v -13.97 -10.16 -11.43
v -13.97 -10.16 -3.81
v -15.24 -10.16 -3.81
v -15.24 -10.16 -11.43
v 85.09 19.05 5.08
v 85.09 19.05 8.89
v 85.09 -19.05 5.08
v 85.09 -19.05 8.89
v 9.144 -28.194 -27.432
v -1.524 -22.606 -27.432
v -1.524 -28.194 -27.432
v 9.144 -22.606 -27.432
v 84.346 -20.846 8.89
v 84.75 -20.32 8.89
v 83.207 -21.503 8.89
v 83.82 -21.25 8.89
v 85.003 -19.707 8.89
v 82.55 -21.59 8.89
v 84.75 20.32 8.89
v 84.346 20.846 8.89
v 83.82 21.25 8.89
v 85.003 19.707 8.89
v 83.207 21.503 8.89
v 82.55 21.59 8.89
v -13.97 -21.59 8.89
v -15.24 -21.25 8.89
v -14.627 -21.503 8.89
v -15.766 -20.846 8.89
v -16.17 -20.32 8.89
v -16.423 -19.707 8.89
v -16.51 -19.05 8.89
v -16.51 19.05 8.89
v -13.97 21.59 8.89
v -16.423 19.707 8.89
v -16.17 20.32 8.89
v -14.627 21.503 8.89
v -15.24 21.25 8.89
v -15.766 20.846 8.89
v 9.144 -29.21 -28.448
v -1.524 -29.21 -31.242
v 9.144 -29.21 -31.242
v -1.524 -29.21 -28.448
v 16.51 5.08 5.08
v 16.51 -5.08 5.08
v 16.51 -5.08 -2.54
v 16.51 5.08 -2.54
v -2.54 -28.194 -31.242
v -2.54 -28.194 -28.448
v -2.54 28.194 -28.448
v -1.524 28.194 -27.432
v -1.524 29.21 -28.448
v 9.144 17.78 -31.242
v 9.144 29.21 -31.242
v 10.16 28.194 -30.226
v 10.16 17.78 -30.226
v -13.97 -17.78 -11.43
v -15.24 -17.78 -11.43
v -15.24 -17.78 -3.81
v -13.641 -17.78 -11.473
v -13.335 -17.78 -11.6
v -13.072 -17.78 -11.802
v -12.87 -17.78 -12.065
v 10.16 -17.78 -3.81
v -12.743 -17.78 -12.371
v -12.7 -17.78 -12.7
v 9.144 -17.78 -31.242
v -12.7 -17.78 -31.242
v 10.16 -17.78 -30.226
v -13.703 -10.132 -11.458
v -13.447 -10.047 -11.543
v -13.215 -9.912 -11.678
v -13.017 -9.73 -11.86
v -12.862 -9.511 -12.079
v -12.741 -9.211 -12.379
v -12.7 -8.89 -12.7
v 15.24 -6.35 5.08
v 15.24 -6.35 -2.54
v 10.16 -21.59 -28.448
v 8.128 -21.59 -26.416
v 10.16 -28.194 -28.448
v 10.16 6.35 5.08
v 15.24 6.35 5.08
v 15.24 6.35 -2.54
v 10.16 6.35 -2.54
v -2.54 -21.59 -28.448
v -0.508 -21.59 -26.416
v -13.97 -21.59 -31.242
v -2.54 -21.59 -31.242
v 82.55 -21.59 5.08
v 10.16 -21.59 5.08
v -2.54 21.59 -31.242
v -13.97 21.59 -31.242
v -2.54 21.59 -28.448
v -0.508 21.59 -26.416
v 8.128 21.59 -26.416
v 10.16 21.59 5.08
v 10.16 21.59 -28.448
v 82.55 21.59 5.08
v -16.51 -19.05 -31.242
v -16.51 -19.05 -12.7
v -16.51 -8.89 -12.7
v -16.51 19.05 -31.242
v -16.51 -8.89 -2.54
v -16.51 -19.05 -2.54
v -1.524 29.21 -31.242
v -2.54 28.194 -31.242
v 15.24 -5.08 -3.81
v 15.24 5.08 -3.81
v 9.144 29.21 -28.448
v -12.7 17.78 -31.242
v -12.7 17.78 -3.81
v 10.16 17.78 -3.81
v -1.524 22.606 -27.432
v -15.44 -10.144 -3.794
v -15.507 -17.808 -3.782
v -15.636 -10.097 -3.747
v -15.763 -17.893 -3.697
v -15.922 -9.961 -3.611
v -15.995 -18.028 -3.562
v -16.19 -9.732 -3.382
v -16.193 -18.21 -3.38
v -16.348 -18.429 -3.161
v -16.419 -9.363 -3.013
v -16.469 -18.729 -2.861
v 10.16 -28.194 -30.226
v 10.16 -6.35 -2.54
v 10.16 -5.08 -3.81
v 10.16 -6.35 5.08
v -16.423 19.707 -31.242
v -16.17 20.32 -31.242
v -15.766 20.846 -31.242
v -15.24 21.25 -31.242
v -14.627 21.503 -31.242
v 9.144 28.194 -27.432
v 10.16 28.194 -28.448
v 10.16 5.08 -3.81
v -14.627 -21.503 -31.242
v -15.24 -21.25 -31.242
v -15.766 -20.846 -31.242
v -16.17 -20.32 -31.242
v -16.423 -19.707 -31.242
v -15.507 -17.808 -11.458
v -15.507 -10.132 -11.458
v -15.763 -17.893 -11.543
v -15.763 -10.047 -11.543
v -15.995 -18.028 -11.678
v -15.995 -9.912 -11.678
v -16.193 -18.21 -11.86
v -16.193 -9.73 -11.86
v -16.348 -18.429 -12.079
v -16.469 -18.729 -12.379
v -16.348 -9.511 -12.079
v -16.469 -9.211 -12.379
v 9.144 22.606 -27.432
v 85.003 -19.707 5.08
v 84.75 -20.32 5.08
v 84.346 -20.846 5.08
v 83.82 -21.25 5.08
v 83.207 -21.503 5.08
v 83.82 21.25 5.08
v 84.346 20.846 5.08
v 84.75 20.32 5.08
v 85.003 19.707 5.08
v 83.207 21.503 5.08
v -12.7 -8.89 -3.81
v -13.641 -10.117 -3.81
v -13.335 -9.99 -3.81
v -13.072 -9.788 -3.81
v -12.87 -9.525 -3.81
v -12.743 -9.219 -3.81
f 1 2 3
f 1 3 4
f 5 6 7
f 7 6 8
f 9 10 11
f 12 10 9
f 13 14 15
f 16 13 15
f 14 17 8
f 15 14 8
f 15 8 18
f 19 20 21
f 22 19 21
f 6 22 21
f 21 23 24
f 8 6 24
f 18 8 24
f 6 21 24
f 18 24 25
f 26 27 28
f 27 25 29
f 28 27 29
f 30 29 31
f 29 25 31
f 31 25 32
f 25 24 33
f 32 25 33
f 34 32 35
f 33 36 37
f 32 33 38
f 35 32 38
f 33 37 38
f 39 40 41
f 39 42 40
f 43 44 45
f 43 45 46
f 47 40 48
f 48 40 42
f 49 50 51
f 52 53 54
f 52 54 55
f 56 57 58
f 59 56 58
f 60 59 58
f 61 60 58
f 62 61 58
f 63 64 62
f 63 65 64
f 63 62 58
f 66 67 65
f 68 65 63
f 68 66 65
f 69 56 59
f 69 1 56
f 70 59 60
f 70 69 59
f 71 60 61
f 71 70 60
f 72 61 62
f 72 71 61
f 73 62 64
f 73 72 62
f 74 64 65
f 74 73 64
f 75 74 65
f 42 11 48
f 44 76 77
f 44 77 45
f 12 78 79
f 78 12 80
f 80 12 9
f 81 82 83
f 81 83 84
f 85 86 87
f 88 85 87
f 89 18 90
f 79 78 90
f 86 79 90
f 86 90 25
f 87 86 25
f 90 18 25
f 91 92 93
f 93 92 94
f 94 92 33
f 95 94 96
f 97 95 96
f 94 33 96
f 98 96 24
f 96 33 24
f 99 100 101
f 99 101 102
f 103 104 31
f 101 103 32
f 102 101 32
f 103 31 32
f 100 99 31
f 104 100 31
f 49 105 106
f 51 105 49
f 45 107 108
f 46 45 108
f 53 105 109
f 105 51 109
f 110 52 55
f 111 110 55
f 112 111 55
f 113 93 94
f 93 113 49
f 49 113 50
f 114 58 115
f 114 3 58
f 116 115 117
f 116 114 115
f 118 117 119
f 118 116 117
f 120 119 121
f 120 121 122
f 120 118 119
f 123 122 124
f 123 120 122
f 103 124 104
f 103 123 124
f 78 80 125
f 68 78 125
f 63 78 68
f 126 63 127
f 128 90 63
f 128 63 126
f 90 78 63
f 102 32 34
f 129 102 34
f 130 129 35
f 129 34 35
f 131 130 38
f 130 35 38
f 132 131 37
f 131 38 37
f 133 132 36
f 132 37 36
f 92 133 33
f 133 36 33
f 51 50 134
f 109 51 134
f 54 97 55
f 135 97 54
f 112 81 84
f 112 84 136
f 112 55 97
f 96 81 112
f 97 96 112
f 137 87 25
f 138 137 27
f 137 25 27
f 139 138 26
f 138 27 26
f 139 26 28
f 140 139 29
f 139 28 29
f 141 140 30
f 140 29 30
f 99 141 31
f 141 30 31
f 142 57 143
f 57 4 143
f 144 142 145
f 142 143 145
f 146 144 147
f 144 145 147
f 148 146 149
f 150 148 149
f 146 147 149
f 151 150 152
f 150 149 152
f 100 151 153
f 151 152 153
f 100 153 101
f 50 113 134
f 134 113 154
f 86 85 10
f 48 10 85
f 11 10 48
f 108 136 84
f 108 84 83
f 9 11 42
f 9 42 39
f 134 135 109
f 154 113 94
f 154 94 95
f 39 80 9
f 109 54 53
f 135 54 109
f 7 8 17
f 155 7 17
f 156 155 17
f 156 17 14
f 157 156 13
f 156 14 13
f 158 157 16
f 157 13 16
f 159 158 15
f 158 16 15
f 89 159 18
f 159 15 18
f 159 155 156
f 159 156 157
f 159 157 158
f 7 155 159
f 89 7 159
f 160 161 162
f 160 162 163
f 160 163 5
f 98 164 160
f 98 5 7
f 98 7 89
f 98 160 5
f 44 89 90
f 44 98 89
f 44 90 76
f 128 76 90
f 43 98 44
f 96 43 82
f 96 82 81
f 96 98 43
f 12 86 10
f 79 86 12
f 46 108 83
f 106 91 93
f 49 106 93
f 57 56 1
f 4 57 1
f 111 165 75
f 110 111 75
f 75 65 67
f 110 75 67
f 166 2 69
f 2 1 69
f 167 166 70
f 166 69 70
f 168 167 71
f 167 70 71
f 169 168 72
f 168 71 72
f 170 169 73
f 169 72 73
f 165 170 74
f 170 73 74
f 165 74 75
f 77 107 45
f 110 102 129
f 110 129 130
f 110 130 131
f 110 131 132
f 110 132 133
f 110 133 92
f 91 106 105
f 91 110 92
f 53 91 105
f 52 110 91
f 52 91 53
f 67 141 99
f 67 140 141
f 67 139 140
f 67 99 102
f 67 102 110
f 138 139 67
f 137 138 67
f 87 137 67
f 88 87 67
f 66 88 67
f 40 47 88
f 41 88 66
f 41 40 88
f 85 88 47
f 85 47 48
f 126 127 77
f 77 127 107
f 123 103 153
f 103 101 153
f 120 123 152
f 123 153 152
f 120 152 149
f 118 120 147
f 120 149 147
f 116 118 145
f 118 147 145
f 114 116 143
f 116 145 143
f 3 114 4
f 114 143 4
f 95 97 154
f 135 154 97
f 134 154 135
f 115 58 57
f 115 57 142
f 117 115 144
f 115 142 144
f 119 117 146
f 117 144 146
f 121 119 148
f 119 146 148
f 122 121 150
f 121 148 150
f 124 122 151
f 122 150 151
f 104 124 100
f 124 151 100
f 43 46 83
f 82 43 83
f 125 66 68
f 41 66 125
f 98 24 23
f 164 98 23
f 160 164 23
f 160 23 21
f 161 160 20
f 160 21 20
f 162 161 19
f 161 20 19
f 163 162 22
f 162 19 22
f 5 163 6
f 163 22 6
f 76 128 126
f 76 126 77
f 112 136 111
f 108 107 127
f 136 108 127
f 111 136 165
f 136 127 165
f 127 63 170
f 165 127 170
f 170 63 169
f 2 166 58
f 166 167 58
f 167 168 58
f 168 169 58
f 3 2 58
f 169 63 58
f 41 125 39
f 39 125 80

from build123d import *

# Parameters (mm, degrees)
BOSS_EXTRUDE1_DEPTH      = 21.59
BOSS_EXTRUDE1_DEPTH_BACK = 21.59
BOSS_EXTRUDE2_DEPTH      = 6.35
BOSS_EXTRUDE2_DEPTH_BACK = 6.35
SKETCH1_4_W              = 6.35
SKETCH1_4_H              = 3.81
SKETCH3_W                = 26.67
SKETCH3_H                = 31.242
BOSS_EXTRUDE3_DEPTH      = 3.81
FILLET1_R                = 2.54
CHAMFER1_SIZE            = 1.27
SKETCH9_W                = 12.7
SKETCH9_H                = 3.81
BOSS_EXTRUDE6_DEPTH      = 7.62
CHAMFER2_SIZE            = 1.016
CHAMFER3_SIZE            = 1.016
CHAMFER2_OF_MIRROR2_SIZE = 1.016
BOSS_EXTRUDE7_START      = 5.08
BOSS_EXTRUDE7_DEPTH      = 5.08
BOSS_EXTRUDE8_START      = 3.81
BOSS_EXTRUDE8_DEPTH      = 3.81
CHAMFER4_SIZE            = 1.016
SKETCH12_W               = 7.62
SKETCH12_H               = 7.62
CUT_EXTRUDE2_DEPTH       = 3.81
FILLET8_R                = 1.27


with BuildPart() as part:
    # Sketch1 → Boss-Extrude1 (new, two sides: drawn at the far end of the back side and taken through both)
    with BuildSketch(Plane(origin=(0, 0, 0), x_dir=(1, 0, 0), z_dir=(0, 1, 0)).offset(-BOSS_EXTRUDE1_DEPTH_BACK)):
        Polygon((-16.51, 31.242), (-16.51, 0), (10.16, 0), (10.16, 3.81), (-12.7, 3.81), (-12.7, 31.242), align=None)
    extrude(amount=BOSS_EXTRUDE1_DEPTH + BOSS_EXTRUDE1_DEPTH_BACK)

    # Sketch1<4> → Boss-Extrude2 (add, two sides: drawn at the far end of the back side and taken through both)
    with BuildSketch(Plane(origin=(0, 0, 0), x_dir=(1, 0, 0), z_dir=(0, 1, 0)).offset(-BOSS_EXTRUDE2_DEPTH_BACK)):
        with Locations((13.335, 1.905)):
            Rectangle(SKETCH1_4_W, SKETCH1_4_H)
    extrude(amount=BOSS_EXTRUDE2_DEPTH + BOSS_EXTRUDE2_DEPTH_BACK)

    # Sketch3 → Boss-Extrude3 (add)
    with BuildSketch(Plane(origin=(0, 21.59, 0), x_dir=(1, 0, 0), z_dir=(0, 1, 0))):
        with Locations((-3.175, 15.621)):
            Rectangle(SKETCH3_W, SKETCH3_H)
    boss_extrude3 = extrude(amount=-BOSS_EXTRUDE3_DEPTH)

    # Mirror1: Boss-Extrude3 across plane
    add(boss_extrude3.mirror(Plane.ZX))

    # Fillet1
    fillet1_edges = [part.edges().sort_by_distance(p)[0] for p in [
        (-16.51, -21.59, -15.621),
        (-16.51, 21.59, -15.621),
    ]]
    fillet(fillet1_edges, radius=FILLET1_R)

    # Chamfer1
    chamfer1_edges = [part.edges().sort_by_distance(p)[0] for p in [
        (13.335, -6.35, -3.81),
        (16.51, 0, -3.81),
        (16.51, -6.35, -1.905),
        (13.335, 6.35, -3.81),
        (16.51, 6.35, -1.905),
    ]]
    chamfer(chamfer1_edges, length=CHAMFER1_SIZE)

    # Sketch9 → Boss-Extrude6 (add)
    with BuildSketch(Plane.XZ.offset(21.59)):
        with Locations((3.81, -29.337)):
            Rectangle(SKETCH9_W, SKETCH9_H)
    boss_extrude6 = extrude(amount=BOSS_EXTRUDE6_DEPTH)

    # Chamfer2
    chamfer2_edges = [part.edges().sort_by_distance(p)[0] for p in [
        (10.16, -25.4, -27.432),
        (-2.54, -25.4, -27.432),
        (10.16, -29.21, -29.337),
        (3.81, -29.21, -27.432),
        (-2.54, -29.21, -29.337),
    ]]
    chamfer(chamfer2_edges, length=CHAMFER2_SIZE)

    # Chamfer3
    chamfer3_edges = [part.edges().sort_by_distance(p)[0] for p in [
        (3.81, -21.59, -27.432),
        (10.16, -22.987, -31.242),
    ]]
    chamfer(chamfer3_edges, length=CHAMFER3_SIZE)

    # Mirror2: Boss-Extrude6 across plane
    add(boss_extrude6.mirror(Plane.ZX))

    # Chamfer2 of Mirror2
    chamfer2_of_mirror2_edges = [part.edges().sort_by_distance(p)[0] for p in [
        (10.16, 25.4, -27.432),
        (-2.54, 25.4, -27.432),
        (10.16, 29.21, -29.337),
        (3.81, 29.21, -27.432),
        (-2.54, 29.21, -29.337),
    ]]
    chamfer(chamfer2_of_mirror2_edges, length=CHAMFER2_OF_MIRROR2_SIZE)

    # Sketch10 → Boss-Extrude7 (add)
    with BuildSketch(Plane.XY.offset(BOSS_EXTRUDE7_START)):
        with BuildLine():
            Line((10.16, 6.35), (10.16, 21.59))
            Line((10.16, 21.59), (-13.97, 21.59))
            ThreePointArc((-13.97, 21.59), (-15.766051224, 20.846051224), (-16.51, 19.05))
            Line((-16.51, 19.05), (-16.51, -19.05))
            ThreePointArc((-16.51, -19.05), (-15.766051224, -20.846051224), (-13.97, -21.59))
            Line((-13.97, -21.59), (10.16, -21.59))
            Line((10.16, -21.59), (10.16, -6.35))
            Line((10.16, -6.35), (15.24, -6.35))
            Line((15.24, -6.35), (16.51, -5.08))
            Line((16.51, -5.08), (16.51, 5.08))
            Line((16.51, 5.08), (15.24, 6.35))
            Line((15.24, 6.35), (10.16, 6.35))
        make_face()
    extrude(amount=-BOSS_EXTRUDE7_DEPTH)

    # Sketch11 → Boss-Extrude8 (add)
    with BuildSketch(Plane.XY.offset(5.08).offset(BOSS_EXTRUDE8_START)):
        with BuildLine():
            Line((-13.97, 21.59), (82.55, 21.59))
            ThreePointArc((82.55, 21.59), (84.346051224, 20.846051224), (85.09, 19.05))
            Line((85.09, 19.05), (85.09, -19.05))
            ThreePointArc((85.09, -19.05), (84.346051224, -20.846051224), (82.55, -21.59))
            Line((82.55, -21.59), (-13.97, -21.59))
            ThreePointArc((-13.97, -21.59), (-15.766051224, -20.846051224), (-16.51, -19.05))
            Line((-16.51, -19.05), (-16.51, 19.05))
            ThreePointArc((-16.51, 19.05), (-15.766051224, 20.846051224), (-13.97, 21.59))
        make_face()
    extrude(amount=-BOSS_EXTRUDE8_DEPTH)

    # Chamfer4
    chamfer4_edges = [part.edges().sort_by_distance(p)[0] for p in [
        (3.81, 21.59, -27.432),
        (10.16, 22.987, -31.242),
    ]]
    chamfer(chamfer4_edges, length=CHAMFER4_SIZE)

    # Sketch12 → Cut-Extrude2 (cut)
    with BuildSketch(Plane(origin=(-12.7, 0, 0), x_dir=(0, 0, -1), z_dir=(1, 0, 0))):
        with Locations((7.62, -13.97)):
            Rectangle(SKETCH12_W, SKETCH12_H)
    extrude(amount=-CUT_EXTRUDE2_DEPTH, mode=Mode.SUBTRACT)

    # Fillet8
    fillet8_edges = [part.edges().sort_by_distance(p)[0] for p in [
        (-12.7, -13.97, -11.43),
        (-12.7, -10.16, -7.62),
        (-16.51, -17.78, -7.62),
        (-16.51, -13.97, -11.43),
        (-16.51, -10.16, -7.62),
        (-16.51, -13.97, -3.81),
    ]]
    fillet(fillet8_edges, radius=FILLET8_R - 0.0001)  # a hair under: the kernel refuses the full size


solid = part.part
